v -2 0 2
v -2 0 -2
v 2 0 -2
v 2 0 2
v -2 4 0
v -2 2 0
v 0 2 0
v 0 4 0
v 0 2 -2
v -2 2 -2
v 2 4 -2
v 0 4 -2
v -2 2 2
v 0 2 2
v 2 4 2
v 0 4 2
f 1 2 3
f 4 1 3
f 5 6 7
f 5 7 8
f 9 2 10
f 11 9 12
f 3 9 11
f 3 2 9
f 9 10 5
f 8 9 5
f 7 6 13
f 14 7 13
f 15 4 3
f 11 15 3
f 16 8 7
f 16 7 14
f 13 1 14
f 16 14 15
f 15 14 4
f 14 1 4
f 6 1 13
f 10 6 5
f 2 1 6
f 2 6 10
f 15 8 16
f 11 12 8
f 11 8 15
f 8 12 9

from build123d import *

# Parameters (mm, degrees)
SKETCH1_W           = 4
SKETCH1_H           = 4
BOSS_EXTRUDE1_DEPTH = 4
SKETCH2_W           = 2
SKETCH2_H           = 2
CUT_EXTRUDE1_DEPTH  = 2


with BuildPart() as part:
    # Sketch1 → Boss-Extrude1 (new body)
    with BuildSketch(Plane(origin=(0, 0, 0), x_dir=(1, 0, 0), z_dir=(0, 1, 0))):
        Rectangle(SKETCH1_W, SKETCH1_H)
    extrude(amount=BOSS_EXTRUDE1_DEPTH)

    # Sketch2 → Cut-Extrude1 (cut)
    with BuildSketch(Plane.ZY.offset(2)):
        Polygon((-2, 4), (-2, 2), (0, 4), align=None)
        with Locations((1, 3)):
            Rectangle(SKETCH2_W, SKETCH2_H)
    extrude(amount=-CUT_EXTRUDE1_DEPTH, mode=Mode.SUBTRACT)


solid = part.part
